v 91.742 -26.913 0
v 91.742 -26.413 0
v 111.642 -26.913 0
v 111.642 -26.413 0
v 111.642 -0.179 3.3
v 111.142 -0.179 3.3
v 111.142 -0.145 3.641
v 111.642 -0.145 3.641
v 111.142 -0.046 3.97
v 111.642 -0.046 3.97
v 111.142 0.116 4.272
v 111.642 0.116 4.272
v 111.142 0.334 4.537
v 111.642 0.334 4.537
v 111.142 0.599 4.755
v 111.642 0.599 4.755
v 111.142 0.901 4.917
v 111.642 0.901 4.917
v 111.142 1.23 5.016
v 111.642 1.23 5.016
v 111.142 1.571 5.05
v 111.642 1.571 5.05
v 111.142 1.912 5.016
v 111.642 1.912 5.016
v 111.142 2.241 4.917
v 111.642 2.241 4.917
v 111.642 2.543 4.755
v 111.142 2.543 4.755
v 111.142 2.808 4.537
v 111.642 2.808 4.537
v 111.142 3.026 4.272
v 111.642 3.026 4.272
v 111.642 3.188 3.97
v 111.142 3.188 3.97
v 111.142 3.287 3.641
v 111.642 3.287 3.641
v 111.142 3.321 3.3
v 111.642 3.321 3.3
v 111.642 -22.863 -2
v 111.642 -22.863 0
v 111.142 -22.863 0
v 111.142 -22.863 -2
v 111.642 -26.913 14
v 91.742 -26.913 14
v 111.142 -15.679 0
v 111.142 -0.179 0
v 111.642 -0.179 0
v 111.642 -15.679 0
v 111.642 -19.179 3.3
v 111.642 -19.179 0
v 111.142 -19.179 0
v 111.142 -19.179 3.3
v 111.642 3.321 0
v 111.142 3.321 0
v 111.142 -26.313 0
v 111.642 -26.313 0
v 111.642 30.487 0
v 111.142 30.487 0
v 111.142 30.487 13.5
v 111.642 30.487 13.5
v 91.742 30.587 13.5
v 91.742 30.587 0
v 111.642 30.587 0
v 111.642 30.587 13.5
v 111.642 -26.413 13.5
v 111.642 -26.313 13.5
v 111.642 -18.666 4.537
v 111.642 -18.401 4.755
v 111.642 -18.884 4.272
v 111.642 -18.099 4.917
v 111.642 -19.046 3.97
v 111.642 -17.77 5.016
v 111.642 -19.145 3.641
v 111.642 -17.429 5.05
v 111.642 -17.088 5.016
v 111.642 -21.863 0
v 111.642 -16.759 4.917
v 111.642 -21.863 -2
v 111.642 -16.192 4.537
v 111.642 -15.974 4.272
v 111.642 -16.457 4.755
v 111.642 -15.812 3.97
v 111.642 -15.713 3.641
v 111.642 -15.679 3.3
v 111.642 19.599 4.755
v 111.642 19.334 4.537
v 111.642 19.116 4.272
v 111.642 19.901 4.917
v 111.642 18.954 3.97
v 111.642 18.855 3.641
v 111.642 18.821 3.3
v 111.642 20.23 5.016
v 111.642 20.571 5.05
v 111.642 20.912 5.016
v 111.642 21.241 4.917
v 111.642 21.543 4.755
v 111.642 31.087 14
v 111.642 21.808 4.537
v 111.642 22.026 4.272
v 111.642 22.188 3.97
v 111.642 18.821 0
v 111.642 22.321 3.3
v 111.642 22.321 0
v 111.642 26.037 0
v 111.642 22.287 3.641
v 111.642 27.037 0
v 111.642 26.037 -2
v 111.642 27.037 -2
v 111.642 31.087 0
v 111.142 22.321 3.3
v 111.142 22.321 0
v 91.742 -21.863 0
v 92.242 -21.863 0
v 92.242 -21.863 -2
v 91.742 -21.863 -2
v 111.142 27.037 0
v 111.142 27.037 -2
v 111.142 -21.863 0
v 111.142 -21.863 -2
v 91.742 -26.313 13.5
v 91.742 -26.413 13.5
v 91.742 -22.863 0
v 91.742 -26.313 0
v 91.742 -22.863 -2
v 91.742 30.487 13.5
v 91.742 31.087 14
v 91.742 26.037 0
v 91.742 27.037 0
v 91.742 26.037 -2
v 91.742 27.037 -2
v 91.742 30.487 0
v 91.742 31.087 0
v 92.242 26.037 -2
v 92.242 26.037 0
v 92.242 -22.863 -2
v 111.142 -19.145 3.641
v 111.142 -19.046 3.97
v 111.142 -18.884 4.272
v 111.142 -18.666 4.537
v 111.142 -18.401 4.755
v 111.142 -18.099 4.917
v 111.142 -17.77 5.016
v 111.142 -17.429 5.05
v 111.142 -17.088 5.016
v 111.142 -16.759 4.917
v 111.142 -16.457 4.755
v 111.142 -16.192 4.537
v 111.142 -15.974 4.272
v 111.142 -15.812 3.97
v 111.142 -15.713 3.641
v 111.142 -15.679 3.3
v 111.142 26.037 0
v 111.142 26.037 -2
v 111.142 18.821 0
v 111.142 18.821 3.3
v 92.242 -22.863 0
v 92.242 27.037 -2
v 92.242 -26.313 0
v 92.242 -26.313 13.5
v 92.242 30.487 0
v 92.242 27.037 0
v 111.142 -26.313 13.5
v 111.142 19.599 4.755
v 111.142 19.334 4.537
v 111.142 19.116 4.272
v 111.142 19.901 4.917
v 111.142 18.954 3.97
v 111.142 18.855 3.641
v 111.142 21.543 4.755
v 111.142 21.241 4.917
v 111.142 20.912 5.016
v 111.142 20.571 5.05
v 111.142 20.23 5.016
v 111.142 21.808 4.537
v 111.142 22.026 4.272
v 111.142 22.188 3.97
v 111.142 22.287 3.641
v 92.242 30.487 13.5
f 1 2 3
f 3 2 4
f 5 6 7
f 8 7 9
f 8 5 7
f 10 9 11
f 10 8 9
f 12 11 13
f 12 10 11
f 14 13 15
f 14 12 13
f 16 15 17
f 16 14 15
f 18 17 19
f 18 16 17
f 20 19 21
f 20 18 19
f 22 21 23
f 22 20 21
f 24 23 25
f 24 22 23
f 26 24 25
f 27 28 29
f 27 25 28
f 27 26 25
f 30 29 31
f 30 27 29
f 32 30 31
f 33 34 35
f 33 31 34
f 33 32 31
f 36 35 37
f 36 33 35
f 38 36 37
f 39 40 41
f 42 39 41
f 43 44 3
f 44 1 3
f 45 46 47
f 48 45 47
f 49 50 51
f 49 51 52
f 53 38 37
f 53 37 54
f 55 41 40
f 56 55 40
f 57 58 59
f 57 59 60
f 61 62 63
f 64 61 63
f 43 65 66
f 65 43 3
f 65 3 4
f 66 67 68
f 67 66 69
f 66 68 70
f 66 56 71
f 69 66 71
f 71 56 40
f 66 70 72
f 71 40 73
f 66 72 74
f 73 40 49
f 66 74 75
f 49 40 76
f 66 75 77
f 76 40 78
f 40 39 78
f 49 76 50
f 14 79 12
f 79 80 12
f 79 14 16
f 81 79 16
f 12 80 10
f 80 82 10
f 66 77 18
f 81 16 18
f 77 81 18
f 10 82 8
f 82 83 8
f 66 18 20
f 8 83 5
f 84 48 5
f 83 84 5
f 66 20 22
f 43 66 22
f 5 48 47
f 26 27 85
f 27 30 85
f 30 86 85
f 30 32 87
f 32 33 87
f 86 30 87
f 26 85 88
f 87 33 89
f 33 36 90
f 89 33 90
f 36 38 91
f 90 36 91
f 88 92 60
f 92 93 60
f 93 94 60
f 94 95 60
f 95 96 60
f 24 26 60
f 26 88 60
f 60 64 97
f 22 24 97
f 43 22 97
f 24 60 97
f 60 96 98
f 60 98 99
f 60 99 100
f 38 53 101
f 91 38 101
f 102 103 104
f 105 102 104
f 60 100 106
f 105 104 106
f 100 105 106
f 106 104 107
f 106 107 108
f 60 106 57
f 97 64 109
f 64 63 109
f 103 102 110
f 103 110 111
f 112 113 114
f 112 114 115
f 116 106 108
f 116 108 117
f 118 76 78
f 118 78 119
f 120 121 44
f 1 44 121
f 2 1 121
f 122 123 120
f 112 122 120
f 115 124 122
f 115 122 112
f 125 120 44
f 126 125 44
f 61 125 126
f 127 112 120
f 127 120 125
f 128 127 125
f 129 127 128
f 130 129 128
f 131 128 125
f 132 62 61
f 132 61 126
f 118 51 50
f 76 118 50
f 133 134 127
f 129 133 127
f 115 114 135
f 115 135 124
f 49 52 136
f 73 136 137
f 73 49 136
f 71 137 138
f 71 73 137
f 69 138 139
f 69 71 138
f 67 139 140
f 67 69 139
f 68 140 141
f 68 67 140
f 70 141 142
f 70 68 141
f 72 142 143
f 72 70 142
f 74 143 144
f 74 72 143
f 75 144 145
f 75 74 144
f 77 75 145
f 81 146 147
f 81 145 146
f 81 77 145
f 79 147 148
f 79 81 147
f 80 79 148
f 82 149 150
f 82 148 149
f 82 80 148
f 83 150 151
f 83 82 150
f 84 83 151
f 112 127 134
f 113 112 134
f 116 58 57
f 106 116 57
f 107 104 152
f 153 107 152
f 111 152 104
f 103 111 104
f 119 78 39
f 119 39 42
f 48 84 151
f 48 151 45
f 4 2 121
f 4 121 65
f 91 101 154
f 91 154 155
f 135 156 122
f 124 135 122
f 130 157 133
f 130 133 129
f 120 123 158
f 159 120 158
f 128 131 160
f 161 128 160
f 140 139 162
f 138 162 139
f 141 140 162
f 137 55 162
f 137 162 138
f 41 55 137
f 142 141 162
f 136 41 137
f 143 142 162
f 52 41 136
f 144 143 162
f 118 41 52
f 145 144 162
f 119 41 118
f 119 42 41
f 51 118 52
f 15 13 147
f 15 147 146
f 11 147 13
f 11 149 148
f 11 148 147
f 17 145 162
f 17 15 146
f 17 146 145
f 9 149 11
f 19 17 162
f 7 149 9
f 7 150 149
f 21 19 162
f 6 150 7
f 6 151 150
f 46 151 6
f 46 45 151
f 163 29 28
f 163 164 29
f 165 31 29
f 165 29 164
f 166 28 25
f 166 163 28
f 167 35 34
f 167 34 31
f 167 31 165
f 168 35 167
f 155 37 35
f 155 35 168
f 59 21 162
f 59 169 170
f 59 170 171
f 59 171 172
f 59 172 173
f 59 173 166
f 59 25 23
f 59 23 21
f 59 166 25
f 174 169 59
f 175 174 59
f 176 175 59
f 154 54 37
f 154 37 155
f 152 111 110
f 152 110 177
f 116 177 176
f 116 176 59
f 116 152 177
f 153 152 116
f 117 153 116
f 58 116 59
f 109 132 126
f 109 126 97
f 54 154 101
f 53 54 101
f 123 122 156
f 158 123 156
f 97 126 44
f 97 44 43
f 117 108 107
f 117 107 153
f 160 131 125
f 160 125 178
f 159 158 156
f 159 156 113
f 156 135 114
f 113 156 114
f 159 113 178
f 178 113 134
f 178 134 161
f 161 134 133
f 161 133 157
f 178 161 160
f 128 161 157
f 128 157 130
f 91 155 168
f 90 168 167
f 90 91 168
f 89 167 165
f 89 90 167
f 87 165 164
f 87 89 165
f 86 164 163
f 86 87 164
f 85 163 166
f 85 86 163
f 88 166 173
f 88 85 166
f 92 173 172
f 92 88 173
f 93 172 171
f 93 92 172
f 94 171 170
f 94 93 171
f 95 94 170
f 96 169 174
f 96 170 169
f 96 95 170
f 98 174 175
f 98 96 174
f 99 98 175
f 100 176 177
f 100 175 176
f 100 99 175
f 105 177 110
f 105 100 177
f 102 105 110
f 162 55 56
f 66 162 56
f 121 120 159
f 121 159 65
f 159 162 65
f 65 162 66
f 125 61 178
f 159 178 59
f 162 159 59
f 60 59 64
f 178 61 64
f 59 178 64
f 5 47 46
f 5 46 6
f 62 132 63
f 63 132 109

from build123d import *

# Parameters (mm, degrees)
ESQUISSE1_W             = 0.5
ESQUISSE1_H             = 56.8
EXTRUSION1_DEPTH        = 13.5
EXTRUSION1_2_DEPTH      = 13.5
ESQUISSE1_W_2           = 19.9
ESQUISSE1_H_2           = 0.5
EXTRUSION1_3_DEPTH      = 13.5
EXTRUSION1_4_DEPTH      = 13.5
ESQUISSE2_W             = 19.9
ESQUISSE2_H             = 58
EXTRUSION2_DEPTH        = 0.5
ENL_V_MAT_EXTRU_1_DEPTH = 10.5
ESQUISSE4_W             = 0.5
ESQUISSE4_H             = 1
EXTRUSION3_DEPTH        = 2


with BuildPart() as part:
    # Esquisse1 → Extrusion1 (new body)
    with BuildSketch(Plane.XY):
        with Locations((91.99228109, 2.086823856)):
            Rectangle(ESQUISSE1_W, ESQUISSE1_H)
    extrude(amount=EXTRUSION1_DEPTH)



with BuildPart() as body_2:
    # Esquisse1 → Extrusion1 2 (new body)
    with BuildSketch(Plane.XY):
        with Locations((111.39228109, 2.086823856)):
            Rectangle(ESQUISSE1_W, ESQUISSE1_H)
    extrude(amount=EXTRUSION1_2_DEPTH)


with BuildPart() as body_3:
    # Esquisse1 → Extrusion1 3 (new body)
    with BuildSketch(Plane.XY):
        with Locations((101.69228109, 30.836823856)):
            Rectangle(ESQUISSE1_W_2, ESQUISSE1_H_2)
    extrude(amount=EXTRUSION1_3_DEPTH)


with BuildPart() as body_4:
    # Esquisse1 → Extrusion1 4 (new body)
    with BuildSketch(Plane.XY):
        with Locations((101.69228109, -26.663176144)):
            Rectangle(ESQUISSE1_W_2, ESQUISSE1_H_2)
    extrude(amount=EXTRUSION1_4_DEPTH)


with BuildPart() as part_1:
    add(part.part)

    add(body_2.part)  # Extrusion2 merges body 2

    add(body_3.part)  # Extrusion2 merges body 3

    add(body_4.part)  # Extrusion2 merges body 4
    # Esquisse2 → Extrusion2 (add)
    with BuildSketch(Plane.XY.offset(13.5)):
        with Locations((101.69228109, 2.086823856)):
            Rectangle(ESQUISSE2_W, ESQUISSE2_H)
    extrude(amount=EXTRUSION2_DEPTH)

    # Esquisse3 → Enlèv. mat.-Extru.1 (cut)
    with BuildSketch(Plane(origin=(111.64228109, 0, 0), x_dir=(0, 0, -1), z_dir=(1, 0, 0))):
        with BuildLine():
            Line((0, 22.321054975), (0, 18.821054975))
            Line((0, 18.821054975), (-3.3, 18.821054975))
            ThreePointArc((-3.3, 18.821054975), (-5.05, 20.571054975), (-3.3, 22.321054975))
            Line((-3.3, 22.321054975), (0, 22.321054975))
        make_face()
        with BuildLine():
            Line((0, 3.321054975), (0, -0.178945025))
            Line((0, -0.178945025), (-3.3, -0.178945025))
            ThreePointArc((-3.3, -0.178945025), (-5.05, 1.571054975), (-3.3, 3.321054975))
            Line((-3.3, 3.321054975), (0, 3.321054975))
        make_face()
        with BuildLine():
            Line((0, -15.678945025), (0, -19.178945025))
            Line((0, -19.178945025), (-3.3, -19.178945025))
            ThreePointArc((-3.3, -19.178945025), (-5.05, -17.428945025), (-3.3, -15.678945025))
            Line((-3.3, -15.678945025), (0, -15.678945025))
        make_face()
    extrude(amount=-ENL_V_MAT_EXTRU_1_DEPTH, mode=Mode.SUBTRACT)

    # Esquisse4 → Extrusion3 (add)
    with BuildSketch(Plane(origin=(0, 0, 0), x_dir=(-1, 0, 0), z_dir=(0, 0, -1))):
        with Locations((-111.39228109, 26.536823856)):
            Rectangle(ESQUISSE4_W, ESQUISSE4_H)
        with Locations((-91.99228109, 26.536823856)):
            Rectangle(ESQUISSE4_W, ESQUISSE4_H)
        with Locations((-111.39228109, -22.363176144)):
            Rectangle(ESQUISSE4_W, ESQUISSE4_H)
        with Locations((-91.99228109, -22.363176144)):
            Rectangle(ESQUISSE4_W, ESQUISSE4_H)
    extrude(amount=EXTRUSION3_DEPTH)


solid = part_1.part
